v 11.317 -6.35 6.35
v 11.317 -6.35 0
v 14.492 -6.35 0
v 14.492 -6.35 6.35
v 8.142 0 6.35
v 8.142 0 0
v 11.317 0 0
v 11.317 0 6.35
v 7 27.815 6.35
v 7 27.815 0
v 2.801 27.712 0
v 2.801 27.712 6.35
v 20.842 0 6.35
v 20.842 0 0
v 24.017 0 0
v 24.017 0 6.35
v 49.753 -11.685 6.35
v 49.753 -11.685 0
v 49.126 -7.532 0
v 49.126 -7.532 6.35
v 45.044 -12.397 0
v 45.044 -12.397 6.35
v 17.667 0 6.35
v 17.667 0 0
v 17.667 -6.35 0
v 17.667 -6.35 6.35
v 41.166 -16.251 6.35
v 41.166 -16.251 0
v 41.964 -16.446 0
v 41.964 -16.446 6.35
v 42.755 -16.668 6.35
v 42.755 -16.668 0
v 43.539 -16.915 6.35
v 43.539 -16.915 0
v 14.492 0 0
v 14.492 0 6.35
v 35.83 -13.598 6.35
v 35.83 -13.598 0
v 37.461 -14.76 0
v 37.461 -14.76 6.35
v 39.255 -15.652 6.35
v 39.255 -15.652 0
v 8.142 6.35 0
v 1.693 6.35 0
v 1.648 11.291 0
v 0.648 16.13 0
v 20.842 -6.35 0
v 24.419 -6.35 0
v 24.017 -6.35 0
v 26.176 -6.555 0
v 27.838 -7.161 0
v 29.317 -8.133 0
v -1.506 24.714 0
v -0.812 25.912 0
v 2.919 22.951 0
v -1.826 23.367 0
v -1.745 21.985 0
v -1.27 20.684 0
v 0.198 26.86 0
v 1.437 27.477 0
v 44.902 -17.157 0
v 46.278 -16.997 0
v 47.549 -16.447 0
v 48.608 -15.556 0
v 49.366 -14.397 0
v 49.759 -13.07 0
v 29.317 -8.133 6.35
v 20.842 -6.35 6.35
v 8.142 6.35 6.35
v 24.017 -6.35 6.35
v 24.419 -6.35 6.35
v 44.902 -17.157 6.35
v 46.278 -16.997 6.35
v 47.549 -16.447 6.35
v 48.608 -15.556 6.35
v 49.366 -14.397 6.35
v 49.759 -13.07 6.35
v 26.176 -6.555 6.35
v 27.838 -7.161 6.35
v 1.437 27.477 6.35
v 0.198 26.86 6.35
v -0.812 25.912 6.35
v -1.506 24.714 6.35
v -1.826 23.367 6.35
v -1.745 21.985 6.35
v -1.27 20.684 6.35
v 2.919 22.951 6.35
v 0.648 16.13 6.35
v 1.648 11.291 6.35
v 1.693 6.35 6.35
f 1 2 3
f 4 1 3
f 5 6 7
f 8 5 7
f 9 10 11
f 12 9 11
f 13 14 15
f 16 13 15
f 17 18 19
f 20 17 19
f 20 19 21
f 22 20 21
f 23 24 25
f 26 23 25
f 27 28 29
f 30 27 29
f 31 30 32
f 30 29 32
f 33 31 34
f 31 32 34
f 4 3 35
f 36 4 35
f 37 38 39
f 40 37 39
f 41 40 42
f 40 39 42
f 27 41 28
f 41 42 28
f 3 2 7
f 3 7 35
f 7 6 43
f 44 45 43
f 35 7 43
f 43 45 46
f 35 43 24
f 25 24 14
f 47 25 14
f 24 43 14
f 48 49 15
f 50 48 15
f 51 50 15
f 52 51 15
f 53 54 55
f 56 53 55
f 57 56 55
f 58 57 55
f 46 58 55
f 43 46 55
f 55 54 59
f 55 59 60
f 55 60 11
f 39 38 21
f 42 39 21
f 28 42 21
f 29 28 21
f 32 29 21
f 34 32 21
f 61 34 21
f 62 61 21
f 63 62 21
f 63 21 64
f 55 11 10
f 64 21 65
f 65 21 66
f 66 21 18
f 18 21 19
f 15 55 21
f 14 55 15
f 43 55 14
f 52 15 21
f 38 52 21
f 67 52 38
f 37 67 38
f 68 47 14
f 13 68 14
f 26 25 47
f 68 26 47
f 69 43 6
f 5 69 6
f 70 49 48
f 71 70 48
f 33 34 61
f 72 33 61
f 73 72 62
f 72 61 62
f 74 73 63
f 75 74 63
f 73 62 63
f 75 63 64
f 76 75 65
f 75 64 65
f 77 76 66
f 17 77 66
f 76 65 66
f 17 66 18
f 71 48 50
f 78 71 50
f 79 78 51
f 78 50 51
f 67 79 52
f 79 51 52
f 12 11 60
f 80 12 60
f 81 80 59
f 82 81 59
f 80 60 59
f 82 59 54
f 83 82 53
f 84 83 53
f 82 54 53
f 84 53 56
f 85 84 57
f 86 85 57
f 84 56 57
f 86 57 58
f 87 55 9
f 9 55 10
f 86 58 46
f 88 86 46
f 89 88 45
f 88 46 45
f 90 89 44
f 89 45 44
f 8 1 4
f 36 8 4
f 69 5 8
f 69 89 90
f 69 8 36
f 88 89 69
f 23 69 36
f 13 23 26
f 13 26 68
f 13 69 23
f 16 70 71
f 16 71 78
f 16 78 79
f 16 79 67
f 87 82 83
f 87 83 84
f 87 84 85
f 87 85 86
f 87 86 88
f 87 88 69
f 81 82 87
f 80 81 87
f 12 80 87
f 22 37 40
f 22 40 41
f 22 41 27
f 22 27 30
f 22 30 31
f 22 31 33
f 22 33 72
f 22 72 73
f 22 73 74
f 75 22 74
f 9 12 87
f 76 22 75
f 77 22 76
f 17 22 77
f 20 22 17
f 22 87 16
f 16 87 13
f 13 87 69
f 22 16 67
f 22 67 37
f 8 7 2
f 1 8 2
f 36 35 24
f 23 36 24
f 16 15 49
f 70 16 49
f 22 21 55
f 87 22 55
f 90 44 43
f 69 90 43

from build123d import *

# Parameters (mm, degrees)
BOSS_EXTRUDE1_DEPTH = 6.35


with BuildPart() as part:
    # Sketch1 → Boss-Extrude1 (new body)
    with BuildSketch(Plane.XY):
        with BuildLine():
            Line((8.142065145, 0), (11.317065145, 0))
            Line((11.317065145, 0), (11.317065145, -6.35))
            Line((11.317065145, -6.35), (14.492065145, -6.35))
            Line((14.492065145, -6.35), (14.492065145, 0))
            Line((14.492065145, 0), (17.667065145, 0))
            Line((17.667065145, 0), (17.667065145, -6.35))
            Line((17.667065145, -6.35), (20.842065145, -6.35))
            Line((20.842065145, -6.35), (20.842065145, 0))
            Line((20.842065145, 0), (24.017065145, 0))
            Line((24.017065145, 0), (24.017065145, -6.35))
            Line((24.017065145, -6.35), (24.41861196, -6.35))
            ThreePointArc((24.41861196, -6.35), (27.024805452, -6.80954223), (29.316653546, -8.132741343))
            Line((29.316653546, -8.132741343), (35.829824373, -13.597940583))
            ThreePointArc((35.829824373, -13.597940583), (38.340167596, -15.241639353), (41.166077246, -16.250501778))
            ThreePointArc((41.166077246, -16.250501778), (42.360633111, -16.553938407), (43.539063258, -16.914964572))
            ThreePointArc((43.539063258, -16.914964572), (48.11077138, -16.040373561), (49.753251097, -11.685182984))
            Line((49.753251097, -11.685182984), (49.125880621, -7.532172023))
            Line((49.125880621, -7.532172023), (45.0441793, -12.396554237))
            Line((45.0441793, -12.396554237), (2.918629328, 22.950979207))
            Line((2.918629328, 22.950979207), (7.00033065, 27.815361421))
            Line((7.00033065, 27.815361421), (2.801471518, 27.712037944))
            ThreePointArc((2.801471518, 27.712037944), (-1.202340319, 25.338240278), (-1.269775543, 20.68411554))
            ThreePointArc((-1.269775543, 20.68411554), (1.266371651, 13.735078219), (1.692730633, 6.35))
            Line((1.692730633, 6.35), (8.142065145, 6.35))
            Line((8.142065145, 6.35), (8.142065145, 0))
        make_face()
    extrude(amount=BOSS_EXTRUDE1_DEPTH)


solid = part.part
